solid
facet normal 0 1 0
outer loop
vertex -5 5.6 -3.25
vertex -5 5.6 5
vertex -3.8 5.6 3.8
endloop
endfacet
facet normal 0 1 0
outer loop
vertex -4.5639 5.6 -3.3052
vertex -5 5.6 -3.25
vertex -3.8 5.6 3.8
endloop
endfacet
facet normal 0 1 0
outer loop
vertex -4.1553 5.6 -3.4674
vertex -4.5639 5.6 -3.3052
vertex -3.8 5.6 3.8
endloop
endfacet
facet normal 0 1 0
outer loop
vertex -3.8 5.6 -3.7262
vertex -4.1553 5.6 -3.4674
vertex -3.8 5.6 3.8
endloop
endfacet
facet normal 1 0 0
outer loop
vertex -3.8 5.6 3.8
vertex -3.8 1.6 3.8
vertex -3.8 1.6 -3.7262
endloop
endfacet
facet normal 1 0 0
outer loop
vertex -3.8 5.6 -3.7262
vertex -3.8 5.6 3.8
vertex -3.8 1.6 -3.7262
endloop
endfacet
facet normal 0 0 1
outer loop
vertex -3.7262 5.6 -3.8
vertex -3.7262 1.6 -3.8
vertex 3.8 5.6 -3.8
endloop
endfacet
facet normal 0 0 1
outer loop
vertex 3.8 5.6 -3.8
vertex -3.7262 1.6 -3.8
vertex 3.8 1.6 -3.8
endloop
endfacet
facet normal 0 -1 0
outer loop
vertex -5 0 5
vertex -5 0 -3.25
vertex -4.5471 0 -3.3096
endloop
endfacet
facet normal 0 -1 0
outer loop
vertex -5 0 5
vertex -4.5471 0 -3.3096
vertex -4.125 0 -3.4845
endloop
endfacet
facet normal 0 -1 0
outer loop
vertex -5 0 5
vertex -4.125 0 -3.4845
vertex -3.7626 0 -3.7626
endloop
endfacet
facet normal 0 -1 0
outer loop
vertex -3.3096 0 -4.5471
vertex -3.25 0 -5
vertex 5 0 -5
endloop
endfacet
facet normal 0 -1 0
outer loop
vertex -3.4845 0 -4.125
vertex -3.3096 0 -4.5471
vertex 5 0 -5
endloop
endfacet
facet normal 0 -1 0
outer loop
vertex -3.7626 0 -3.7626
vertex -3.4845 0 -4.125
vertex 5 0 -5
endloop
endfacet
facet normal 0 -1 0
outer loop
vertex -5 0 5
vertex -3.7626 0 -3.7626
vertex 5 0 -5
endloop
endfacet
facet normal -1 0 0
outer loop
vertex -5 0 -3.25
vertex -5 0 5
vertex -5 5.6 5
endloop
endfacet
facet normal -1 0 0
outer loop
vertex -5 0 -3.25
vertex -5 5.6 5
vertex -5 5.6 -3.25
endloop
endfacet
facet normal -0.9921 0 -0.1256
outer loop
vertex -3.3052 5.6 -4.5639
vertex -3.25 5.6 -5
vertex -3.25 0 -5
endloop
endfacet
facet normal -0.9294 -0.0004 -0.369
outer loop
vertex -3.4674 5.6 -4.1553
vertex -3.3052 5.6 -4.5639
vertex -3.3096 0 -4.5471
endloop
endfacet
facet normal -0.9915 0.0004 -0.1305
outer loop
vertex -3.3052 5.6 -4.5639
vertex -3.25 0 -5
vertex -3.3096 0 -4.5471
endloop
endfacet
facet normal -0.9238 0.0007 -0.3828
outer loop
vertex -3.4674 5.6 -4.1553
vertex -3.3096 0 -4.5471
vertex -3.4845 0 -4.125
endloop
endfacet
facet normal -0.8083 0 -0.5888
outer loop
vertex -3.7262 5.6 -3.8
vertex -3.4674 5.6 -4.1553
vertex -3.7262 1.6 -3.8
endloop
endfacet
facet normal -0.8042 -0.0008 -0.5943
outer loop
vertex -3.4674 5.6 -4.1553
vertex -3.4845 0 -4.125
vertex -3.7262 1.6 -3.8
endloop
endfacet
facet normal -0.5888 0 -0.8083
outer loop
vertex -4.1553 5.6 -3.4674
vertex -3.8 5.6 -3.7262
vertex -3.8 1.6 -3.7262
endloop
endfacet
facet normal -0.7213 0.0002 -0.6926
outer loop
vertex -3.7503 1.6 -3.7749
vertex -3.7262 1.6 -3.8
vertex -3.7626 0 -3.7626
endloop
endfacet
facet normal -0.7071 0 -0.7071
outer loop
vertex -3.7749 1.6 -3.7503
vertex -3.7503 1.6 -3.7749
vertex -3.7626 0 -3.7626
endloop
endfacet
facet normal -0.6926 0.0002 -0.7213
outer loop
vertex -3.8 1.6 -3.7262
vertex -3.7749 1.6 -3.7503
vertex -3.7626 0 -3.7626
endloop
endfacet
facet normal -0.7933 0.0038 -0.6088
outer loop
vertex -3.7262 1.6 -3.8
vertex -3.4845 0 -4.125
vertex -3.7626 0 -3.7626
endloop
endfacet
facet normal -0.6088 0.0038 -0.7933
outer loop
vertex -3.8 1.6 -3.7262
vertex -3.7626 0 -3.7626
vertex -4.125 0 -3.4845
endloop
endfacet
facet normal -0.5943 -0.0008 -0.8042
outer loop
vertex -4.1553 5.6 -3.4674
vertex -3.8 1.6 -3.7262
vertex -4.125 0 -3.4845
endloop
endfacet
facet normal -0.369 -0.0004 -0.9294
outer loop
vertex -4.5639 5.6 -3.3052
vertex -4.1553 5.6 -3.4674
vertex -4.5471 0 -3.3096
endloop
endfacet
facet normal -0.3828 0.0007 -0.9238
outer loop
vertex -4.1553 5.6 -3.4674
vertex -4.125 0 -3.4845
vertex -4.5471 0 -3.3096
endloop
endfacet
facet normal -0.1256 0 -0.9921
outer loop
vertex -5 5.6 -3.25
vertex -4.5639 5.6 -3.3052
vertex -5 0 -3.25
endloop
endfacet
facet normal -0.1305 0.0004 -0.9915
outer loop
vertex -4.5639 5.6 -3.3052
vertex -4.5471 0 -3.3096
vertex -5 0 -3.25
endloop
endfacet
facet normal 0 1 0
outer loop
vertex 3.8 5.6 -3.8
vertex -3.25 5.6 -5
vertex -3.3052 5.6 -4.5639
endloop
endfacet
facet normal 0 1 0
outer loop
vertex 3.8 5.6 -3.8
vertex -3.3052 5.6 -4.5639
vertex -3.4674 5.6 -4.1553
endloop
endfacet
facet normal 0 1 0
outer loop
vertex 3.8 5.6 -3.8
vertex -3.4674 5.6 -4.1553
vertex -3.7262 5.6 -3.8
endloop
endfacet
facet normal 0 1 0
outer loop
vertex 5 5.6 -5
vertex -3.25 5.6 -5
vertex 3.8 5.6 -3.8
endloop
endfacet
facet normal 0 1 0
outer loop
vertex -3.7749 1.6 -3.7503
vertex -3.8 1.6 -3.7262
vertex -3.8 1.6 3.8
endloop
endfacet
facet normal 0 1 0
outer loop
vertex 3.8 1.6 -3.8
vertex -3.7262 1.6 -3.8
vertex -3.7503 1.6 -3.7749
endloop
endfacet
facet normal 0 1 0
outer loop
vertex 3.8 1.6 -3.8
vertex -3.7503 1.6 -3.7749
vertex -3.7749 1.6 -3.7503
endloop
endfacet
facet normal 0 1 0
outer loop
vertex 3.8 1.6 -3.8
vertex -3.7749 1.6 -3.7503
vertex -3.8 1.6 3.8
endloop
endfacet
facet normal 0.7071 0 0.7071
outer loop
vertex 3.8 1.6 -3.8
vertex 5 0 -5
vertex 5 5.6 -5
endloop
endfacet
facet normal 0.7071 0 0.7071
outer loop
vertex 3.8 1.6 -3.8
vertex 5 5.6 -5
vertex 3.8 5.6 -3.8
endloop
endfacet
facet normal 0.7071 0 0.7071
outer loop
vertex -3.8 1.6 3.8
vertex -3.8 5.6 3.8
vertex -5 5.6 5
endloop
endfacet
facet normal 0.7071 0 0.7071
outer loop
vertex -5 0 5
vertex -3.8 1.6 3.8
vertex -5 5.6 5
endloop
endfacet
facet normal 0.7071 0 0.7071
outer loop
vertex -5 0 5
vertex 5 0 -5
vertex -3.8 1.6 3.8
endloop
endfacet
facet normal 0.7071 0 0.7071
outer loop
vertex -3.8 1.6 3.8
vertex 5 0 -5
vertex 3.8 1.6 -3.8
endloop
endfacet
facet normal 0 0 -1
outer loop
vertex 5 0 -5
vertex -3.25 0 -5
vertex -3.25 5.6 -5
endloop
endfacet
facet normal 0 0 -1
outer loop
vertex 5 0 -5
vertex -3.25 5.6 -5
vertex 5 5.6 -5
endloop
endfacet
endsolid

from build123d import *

# Parameters (mm, degrees)
SKETCH2_W           = 10
SKETCH2_H           = 10
BOSS_EXTRUDE1_DEPTH = 1.6
SKETCH4_W           = 10
SKETCH4_H           = 10
SKETCH4_W_2         = 7.6
SKETCH4_H_2         = 7.6
EXTRUDE_THIN1_DEPTH = 4
CUT_EXTRUDE1_DEPTH  = 5.6
SKETCH6_R           = 1.75
CUT_EXTRUDE2_DEPTH  = 5.6


with BuildPart() as part:
    # Sketch2 → Boss-Extrude1 (new body)
    with BuildSketch(Plane(origin=(0, 0, 0), x_dir=(1, 0, 0), z_dir=(0, 1, 0))):
        Rectangle(SKETCH2_W, SKETCH2_H)
    extrude(amount=BOSS_EXTRUDE1_DEPTH)

    # Sketch4 → Extrude-Thin1 (add)
    with BuildSketch(Plane(origin=(0, 1.6, 0), x_dir=(1, 0, 0), z_dir=(0, 1, 0))):
        Rectangle(SKETCH4_W, SKETCH4_H)
        Rectangle(SKETCH4_W_2, SKETCH4_H_2, mode=Mode.SUBTRACT)
    extrude(amount=EXTRUDE_THIN1_DEPTH)

    # Sketch5 → Cut-Extrude1 (cut)
    with BuildSketch(Plane.XZ):
        Polygon((-5, 5), (5, 5), (5, -5), align=None)
    extrude(amount=-CUT_EXTRUDE1_DEPTH, mode=Mode.SUBTRACT)

    # Sketch6 → Cut-Extrude2 (cut)
    with BuildSketch(Plane.XZ):
        with Locations((-5, -5)):
            Circle(SKETCH6_R)
    extrude(amount=-CUT_EXTRUDE2_DEPTH, mode=Mode.SUBTRACT)


solid = part.part
